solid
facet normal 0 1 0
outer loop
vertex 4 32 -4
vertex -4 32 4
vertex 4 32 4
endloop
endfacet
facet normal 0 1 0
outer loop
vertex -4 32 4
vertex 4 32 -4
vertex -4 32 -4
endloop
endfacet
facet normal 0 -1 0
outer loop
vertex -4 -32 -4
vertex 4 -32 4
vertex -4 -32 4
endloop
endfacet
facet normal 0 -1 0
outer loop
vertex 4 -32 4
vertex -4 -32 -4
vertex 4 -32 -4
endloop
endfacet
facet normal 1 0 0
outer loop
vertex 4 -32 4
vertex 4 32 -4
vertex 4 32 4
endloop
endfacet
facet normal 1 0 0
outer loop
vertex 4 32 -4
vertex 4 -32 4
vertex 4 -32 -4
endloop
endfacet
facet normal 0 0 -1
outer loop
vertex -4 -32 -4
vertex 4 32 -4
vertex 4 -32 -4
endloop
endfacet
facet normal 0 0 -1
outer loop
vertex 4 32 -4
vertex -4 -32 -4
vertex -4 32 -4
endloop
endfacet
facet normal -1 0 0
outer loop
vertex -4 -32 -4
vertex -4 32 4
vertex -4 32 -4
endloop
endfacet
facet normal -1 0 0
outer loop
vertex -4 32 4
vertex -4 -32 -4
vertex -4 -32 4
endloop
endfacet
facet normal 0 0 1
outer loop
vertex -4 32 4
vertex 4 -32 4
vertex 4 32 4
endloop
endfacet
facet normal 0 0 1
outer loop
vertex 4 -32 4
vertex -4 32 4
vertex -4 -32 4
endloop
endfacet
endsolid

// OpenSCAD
size = 32;//block=32 //item=8

rotate([0, 90, 90]) {
  cube([size * 0.25, size * 0.25, size * 2], center = true);
}
;
